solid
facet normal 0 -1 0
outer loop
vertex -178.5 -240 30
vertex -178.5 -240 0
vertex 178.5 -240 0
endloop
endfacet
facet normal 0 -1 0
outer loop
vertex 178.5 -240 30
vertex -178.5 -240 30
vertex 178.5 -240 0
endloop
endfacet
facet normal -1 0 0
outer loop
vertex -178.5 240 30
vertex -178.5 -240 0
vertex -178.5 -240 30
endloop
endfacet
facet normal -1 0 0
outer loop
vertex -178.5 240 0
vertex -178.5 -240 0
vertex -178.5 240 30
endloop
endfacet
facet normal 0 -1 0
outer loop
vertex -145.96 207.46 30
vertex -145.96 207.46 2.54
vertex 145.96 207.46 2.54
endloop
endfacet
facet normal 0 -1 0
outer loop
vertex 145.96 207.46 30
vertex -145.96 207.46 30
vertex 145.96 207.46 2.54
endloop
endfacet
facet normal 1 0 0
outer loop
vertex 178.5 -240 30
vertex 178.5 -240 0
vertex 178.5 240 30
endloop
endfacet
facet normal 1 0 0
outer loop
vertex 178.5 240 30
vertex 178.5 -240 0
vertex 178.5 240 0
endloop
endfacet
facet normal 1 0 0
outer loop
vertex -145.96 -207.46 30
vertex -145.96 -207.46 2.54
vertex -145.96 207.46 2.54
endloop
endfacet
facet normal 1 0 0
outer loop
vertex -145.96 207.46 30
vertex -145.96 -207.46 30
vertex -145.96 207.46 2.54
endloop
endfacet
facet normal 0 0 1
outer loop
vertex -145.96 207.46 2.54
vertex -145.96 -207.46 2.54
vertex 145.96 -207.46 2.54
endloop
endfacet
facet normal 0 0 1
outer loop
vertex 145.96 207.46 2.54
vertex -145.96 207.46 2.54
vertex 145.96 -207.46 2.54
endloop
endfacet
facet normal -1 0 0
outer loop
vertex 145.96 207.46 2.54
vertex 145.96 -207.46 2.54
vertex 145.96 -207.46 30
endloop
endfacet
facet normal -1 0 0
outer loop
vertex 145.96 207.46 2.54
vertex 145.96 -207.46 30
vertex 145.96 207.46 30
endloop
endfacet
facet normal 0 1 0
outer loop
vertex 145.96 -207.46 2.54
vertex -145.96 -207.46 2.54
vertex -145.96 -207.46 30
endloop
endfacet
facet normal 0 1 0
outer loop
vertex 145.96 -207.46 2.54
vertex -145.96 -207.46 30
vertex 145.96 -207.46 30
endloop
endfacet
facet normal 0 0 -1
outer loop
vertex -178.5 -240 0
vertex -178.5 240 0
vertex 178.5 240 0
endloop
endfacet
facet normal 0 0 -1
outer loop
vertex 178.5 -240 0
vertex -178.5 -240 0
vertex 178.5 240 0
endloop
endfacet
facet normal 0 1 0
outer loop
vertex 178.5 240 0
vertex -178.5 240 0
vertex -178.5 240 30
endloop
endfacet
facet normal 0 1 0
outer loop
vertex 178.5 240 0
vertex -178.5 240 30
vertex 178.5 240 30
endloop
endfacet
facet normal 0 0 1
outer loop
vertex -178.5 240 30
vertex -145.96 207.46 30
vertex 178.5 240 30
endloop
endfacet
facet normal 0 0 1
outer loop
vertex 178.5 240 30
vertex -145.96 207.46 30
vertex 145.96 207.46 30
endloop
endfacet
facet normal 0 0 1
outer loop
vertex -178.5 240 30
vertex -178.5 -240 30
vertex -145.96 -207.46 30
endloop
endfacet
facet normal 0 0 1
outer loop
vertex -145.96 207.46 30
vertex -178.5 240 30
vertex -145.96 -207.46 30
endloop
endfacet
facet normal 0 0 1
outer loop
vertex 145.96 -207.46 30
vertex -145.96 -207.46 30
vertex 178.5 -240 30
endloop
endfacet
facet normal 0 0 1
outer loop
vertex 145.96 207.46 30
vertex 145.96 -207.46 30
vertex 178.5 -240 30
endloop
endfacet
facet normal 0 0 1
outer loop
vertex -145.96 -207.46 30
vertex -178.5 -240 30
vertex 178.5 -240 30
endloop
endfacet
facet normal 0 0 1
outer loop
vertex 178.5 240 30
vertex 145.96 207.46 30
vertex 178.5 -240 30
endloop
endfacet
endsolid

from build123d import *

# Parameters (mm, degrees)
F0_W     = 357
F0_H     = 480
F1_DEPTH = 30
F2_T     = -2.54
F3_DEPTH = 30
F4_DEPTH = 30
F5_DEPTH = 30
F6_DEPTH = 30


with BuildPart() as f1:
    # F0 (on Top) → F1 (new body)
    with BuildSketch(Plane.XY):
        Rectangle(F0_W, F0_H)
    extrude(amount=F1_DEPTH)

    # F2
    f2_openings = [f1.faces().sort_by_distance(p)[0] for p in [
        (0, 0, 30),
    ]]
    offset(amount=F2_T, openings=f2_openings)

    # F3 (add): a face of the model
    f3_faces = [f1.faces().sort_by_distance(p)[0] for p in [
        (0, 237.46, 16.27),
    ]]
    extrude(f3_faces, amount=F3_DEPTH)

    # F4 (add): a face of the model
    f4_faces = [f1.faces().sort_by_distance(p)[0] for p in [
        (175.96, -15, 16.27),
    ]]
    extrude(f4_faces, amount=F4_DEPTH)

    # F5 (add): a face of the model
    f5_faces = [f1.faces().sort_by_distance(p)[0] for p in [
        (-175.96, -15, 16.27),
    ]]
    extrude(f5_faces, amount=F5_DEPTH)

    # F6 (add): a face of the model
    f6_faces = [f1.faces().sort_by_distance(p)[0] for p in [
        (0, -237.46, 16.27),
    ]]
    extrude(f6_faces, amount=F6_DEPTH)


solid = f1.part
